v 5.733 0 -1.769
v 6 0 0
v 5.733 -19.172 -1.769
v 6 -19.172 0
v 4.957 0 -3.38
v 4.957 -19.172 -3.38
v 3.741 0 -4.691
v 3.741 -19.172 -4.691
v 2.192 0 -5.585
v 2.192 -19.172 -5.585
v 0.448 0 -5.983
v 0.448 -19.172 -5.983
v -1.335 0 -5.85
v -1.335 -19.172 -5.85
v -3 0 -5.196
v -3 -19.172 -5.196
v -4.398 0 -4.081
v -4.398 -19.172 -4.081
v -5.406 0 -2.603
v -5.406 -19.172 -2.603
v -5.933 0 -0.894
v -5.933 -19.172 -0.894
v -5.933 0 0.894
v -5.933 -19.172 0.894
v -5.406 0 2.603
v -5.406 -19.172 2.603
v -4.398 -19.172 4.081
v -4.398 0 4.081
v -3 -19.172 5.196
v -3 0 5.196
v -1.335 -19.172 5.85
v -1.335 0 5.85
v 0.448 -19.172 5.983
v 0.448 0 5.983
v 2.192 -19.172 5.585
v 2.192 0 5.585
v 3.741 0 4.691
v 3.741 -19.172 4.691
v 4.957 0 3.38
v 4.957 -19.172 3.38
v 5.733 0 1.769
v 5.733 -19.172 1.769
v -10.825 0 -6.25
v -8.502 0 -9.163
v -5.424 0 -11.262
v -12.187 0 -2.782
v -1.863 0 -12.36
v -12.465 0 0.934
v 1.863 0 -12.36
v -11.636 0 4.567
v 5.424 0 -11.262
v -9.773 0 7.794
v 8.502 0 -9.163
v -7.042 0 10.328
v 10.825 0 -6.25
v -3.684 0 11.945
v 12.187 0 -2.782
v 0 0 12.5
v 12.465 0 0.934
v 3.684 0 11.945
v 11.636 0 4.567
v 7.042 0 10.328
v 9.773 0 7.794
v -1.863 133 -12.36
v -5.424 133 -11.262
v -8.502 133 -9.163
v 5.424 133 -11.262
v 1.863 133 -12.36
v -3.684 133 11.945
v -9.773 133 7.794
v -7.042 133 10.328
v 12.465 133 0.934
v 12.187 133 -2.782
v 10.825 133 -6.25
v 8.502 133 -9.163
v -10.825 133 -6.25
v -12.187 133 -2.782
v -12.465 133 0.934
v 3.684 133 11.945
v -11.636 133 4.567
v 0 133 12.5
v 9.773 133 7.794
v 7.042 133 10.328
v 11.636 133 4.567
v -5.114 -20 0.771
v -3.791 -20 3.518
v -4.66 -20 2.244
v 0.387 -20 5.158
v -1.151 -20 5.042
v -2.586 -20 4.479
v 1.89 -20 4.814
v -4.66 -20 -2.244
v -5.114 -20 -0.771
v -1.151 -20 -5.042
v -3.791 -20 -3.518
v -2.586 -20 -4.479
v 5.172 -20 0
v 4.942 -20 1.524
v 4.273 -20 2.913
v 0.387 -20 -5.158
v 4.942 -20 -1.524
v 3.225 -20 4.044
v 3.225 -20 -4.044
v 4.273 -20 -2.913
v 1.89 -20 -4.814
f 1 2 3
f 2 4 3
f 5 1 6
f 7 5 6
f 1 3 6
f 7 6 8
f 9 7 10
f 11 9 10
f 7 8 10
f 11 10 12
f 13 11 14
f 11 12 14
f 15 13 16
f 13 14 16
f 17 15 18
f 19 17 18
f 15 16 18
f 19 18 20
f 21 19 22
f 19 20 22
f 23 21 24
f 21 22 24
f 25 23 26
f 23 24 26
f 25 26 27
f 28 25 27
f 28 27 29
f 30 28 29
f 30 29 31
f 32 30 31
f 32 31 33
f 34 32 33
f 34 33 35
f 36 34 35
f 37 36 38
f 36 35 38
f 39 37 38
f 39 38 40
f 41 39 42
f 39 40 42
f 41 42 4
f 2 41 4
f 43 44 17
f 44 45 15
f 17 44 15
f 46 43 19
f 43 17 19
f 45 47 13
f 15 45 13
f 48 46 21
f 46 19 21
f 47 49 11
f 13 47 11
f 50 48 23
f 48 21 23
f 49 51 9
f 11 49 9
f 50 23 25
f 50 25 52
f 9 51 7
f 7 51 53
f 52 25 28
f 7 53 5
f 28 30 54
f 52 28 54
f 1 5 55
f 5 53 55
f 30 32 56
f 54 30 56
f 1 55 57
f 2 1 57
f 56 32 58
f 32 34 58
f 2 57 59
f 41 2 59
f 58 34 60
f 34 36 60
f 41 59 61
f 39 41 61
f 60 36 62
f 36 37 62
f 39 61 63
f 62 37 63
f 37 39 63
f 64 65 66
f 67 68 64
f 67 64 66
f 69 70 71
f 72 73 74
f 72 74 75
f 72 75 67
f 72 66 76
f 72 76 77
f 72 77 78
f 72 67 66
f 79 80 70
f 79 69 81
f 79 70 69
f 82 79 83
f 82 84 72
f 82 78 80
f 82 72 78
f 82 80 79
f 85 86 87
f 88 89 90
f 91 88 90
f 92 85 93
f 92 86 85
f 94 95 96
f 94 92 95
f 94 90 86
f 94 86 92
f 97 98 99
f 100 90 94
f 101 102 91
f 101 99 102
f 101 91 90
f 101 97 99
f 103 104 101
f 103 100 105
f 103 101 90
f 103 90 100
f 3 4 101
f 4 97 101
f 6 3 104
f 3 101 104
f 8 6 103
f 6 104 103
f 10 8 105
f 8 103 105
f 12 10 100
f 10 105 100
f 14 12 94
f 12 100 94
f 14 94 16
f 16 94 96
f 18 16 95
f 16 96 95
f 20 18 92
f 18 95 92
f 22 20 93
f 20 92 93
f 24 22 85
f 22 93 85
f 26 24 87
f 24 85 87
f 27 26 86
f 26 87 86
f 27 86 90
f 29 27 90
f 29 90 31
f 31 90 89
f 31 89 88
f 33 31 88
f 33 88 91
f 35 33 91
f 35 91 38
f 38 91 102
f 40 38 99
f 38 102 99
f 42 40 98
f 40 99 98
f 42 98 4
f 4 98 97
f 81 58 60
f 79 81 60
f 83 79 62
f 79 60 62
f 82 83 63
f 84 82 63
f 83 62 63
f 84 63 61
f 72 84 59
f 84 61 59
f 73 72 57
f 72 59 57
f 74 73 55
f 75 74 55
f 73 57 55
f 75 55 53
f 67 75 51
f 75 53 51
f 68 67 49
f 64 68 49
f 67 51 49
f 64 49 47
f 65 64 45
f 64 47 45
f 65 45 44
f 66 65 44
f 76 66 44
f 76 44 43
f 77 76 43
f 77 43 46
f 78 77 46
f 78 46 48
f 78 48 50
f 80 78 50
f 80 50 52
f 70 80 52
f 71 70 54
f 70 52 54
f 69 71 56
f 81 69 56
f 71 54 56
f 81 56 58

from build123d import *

# Parameters (mm, degrees)
SKETCH1_R           = 12.5
BOSS_EXTRUDE1_DEPTH = 133
SKETCH2_R           = 10
BOSS_EXTRUDE2_DEPTH = 20


# Read off the part's stored shape, not the designer's step: M12x1.5 Machine Threads Stud1
with BuildPart() as part:
    # Sketch1 → Boss-Extrude1 (new body)
    with BuildSketch(Plane(origin=(0, 0, 0), x_dir=(1, 0, 0), z_dir=(0, 1, 0))):
        with Locations(Location((0, 0, 0), (0, 0, 270))):
            Circle(SKETCH1_R)
    extrude(amount=BOSS_EXTRUDE1_DEPTH)

    # Sketch2 → Boss-Extrude2 (add)
    with BuildSketch(Plane.XZ):
        with Locations(Location((0, 0, 0), (0, 0, 270))):
            Circle(SKETCH2_R)
    extrude(amount=BOSS_EXTRUDE2_DEPTH)

    # M12x1.5 Machine Threads Stud1 outline → M12x1.5 Machine Threads Stud1 (revolve, cut)
    with BuildSketch(Plane.XY):
        Polygon((10, 0), (6, 0), (6, -19.172), (5.172, -20), (10, -20), align=None)
    revolve(axis=Axis((0, 0, 0), (0, 1, 0)), mode=Mode.SUBTRACT)


solid = part.part
